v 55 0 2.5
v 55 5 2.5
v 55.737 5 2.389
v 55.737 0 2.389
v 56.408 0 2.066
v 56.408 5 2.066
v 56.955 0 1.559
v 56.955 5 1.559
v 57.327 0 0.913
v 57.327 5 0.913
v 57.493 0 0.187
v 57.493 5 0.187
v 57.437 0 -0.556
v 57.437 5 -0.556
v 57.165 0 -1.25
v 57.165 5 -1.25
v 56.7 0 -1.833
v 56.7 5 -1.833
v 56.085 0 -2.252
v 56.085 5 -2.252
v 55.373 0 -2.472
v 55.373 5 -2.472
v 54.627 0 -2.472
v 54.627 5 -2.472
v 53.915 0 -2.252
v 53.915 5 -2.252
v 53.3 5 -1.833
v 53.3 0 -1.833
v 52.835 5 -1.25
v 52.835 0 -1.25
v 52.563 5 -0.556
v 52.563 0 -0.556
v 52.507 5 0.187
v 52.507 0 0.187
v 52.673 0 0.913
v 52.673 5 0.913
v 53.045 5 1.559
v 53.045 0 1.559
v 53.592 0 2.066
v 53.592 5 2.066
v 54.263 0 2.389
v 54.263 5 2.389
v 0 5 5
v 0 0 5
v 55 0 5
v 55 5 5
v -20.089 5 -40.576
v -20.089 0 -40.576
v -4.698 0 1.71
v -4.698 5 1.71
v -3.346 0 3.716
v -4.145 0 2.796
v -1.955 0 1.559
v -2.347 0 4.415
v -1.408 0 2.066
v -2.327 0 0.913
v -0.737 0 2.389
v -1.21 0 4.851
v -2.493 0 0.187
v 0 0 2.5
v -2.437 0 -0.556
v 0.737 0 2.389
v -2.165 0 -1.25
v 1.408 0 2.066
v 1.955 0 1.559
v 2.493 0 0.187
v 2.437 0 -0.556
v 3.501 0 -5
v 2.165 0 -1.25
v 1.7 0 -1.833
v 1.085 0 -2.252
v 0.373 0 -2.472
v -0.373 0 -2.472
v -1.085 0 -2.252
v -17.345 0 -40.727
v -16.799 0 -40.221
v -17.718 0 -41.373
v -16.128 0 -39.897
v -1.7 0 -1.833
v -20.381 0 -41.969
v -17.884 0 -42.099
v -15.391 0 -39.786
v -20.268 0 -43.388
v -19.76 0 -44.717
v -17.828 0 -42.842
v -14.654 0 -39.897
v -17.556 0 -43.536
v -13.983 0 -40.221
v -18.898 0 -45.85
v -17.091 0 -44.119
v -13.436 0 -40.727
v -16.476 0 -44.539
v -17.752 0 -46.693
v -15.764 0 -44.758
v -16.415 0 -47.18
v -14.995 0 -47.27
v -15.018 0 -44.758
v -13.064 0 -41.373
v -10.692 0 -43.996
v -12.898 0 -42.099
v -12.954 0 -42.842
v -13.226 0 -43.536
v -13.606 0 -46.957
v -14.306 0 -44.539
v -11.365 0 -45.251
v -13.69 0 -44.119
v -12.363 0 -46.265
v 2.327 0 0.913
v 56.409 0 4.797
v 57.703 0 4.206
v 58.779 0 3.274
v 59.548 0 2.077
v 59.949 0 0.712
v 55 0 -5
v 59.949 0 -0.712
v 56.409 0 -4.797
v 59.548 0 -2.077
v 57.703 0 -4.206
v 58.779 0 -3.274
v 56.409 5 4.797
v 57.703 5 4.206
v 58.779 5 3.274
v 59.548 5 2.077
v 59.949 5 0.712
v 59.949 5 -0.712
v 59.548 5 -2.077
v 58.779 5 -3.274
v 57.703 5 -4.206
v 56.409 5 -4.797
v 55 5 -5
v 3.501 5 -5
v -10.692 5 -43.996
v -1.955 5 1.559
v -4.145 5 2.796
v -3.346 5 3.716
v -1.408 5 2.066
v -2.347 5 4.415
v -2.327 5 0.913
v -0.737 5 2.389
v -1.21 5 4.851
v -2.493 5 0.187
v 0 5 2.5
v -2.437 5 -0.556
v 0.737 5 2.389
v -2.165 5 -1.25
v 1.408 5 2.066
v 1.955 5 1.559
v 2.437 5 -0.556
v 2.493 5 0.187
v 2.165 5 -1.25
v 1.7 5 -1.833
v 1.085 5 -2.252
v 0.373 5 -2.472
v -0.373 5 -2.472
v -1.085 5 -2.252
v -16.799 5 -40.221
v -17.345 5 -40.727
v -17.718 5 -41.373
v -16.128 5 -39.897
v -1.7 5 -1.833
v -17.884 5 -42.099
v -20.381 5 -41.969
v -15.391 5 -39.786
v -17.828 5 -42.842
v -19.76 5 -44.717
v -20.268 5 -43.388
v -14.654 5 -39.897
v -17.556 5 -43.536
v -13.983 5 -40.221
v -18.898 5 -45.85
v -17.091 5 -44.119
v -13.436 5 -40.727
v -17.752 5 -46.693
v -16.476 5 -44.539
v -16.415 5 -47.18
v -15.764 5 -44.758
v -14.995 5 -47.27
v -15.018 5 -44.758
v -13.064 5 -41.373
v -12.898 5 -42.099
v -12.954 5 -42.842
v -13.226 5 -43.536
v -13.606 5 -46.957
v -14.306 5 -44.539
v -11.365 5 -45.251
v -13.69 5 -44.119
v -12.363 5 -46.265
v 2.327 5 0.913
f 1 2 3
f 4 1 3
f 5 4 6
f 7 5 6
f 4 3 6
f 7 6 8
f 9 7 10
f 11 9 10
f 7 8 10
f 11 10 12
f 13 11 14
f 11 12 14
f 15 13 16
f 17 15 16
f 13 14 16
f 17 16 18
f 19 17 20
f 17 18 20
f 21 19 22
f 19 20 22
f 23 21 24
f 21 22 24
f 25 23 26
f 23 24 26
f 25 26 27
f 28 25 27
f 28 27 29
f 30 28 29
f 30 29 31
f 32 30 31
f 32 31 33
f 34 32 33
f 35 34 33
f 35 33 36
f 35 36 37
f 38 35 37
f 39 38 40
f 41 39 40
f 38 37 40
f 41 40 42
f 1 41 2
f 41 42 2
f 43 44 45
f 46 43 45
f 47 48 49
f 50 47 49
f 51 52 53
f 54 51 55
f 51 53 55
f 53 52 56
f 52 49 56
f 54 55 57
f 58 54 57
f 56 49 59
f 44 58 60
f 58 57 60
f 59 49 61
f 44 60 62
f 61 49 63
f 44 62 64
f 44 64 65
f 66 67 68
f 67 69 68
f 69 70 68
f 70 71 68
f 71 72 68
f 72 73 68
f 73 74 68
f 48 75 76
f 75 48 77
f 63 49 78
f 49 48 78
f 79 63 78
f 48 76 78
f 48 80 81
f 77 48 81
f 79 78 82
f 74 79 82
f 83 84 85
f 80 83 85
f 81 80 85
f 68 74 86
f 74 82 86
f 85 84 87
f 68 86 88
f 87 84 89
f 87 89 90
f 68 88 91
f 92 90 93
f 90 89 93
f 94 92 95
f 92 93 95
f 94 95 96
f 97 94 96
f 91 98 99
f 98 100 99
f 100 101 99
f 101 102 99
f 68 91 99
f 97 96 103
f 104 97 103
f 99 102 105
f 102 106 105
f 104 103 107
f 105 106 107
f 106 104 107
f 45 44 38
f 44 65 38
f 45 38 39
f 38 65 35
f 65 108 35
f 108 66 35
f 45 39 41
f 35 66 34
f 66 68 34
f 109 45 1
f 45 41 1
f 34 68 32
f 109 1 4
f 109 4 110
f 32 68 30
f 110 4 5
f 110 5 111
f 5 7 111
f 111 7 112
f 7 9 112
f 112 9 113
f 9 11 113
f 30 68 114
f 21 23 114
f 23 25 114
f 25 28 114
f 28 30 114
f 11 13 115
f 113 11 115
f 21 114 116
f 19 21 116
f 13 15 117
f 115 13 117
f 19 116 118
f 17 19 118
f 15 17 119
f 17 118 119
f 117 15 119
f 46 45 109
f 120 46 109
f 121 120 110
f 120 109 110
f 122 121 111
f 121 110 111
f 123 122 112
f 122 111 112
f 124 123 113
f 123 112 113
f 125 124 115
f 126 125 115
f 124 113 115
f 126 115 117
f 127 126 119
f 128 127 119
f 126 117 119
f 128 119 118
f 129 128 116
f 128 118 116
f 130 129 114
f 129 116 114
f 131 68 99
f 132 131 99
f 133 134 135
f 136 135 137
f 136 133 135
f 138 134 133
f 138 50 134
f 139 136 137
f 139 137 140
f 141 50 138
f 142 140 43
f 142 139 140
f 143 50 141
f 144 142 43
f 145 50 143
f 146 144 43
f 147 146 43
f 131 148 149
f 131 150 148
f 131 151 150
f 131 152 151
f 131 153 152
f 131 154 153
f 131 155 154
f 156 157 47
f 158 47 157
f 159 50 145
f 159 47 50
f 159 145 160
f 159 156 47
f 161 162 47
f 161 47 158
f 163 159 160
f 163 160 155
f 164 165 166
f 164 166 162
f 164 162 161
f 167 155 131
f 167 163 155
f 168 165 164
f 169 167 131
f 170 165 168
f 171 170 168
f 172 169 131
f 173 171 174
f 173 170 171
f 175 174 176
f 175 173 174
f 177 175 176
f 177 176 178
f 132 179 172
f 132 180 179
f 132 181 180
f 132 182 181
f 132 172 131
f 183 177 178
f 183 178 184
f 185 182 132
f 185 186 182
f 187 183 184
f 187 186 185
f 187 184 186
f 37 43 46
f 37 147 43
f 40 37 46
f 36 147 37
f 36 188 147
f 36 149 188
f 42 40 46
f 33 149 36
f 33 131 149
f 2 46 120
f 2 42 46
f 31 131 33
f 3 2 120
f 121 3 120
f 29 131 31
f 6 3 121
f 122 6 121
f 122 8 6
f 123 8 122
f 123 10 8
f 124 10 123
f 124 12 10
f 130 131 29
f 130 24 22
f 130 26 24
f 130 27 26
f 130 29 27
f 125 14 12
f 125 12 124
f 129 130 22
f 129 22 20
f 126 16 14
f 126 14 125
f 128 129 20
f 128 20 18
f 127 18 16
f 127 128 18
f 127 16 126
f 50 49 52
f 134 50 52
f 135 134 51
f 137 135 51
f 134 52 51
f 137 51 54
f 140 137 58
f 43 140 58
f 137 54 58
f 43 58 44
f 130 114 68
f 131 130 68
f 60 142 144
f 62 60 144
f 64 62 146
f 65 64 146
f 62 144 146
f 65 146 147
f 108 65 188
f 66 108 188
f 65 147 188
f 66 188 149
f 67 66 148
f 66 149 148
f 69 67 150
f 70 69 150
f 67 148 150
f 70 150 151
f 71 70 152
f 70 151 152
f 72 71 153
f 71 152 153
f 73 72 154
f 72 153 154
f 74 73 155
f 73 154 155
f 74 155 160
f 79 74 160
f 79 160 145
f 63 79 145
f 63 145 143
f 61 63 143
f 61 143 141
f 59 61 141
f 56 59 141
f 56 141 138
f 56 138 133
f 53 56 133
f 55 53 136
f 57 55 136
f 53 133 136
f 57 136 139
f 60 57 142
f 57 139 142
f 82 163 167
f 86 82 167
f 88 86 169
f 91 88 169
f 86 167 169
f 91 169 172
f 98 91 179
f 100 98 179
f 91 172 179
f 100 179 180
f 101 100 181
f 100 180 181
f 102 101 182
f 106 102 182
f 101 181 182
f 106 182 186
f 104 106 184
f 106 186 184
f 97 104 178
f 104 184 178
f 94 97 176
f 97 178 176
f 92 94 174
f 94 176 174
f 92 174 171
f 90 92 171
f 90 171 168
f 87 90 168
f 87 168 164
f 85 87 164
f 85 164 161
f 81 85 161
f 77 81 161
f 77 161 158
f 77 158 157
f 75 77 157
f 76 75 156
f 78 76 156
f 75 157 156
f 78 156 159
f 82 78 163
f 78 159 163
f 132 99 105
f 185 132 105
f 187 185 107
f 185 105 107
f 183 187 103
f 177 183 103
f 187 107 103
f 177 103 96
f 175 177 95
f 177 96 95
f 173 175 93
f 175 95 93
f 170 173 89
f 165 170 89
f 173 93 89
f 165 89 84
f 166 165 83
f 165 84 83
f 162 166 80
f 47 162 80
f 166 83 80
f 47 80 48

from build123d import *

# Parameters (mm, degrees)
BOSS_EXTRU_1_DEPTH      = 5
ESQUISSE3_R             = 2.5
ENL_V_MAT_EXTRU_1_DEPTH = 5
ESQUISSE4_R             = 2.5
ENL_V_MAT_EXTRU_2_DEPTH = 5


with BuildPart() as part:
    # Esquisse2 → Boss.-Extru.1 (new body)
    with BuildSketch(Plane(origin=(0, 0, 0), x_dir=(1, 0, 0), z_dir=(0, 1, 0))):
        with BuildLine():
            ThreePointArc((-4.698463104, -1.710100717), (-4.095760221, 2.867882182), (0, 5))
            Line((0, 5), (3.501037691, 5))
            Line((3.501037691, 5), (-10.692443346, 43.996268652))
            ThreePointArc((-10.692443346, 43.996268652), (-17.101007166, 46.984631039), (-20.089369554, 40.576067219))
            Line((-20.089369554, 40.576067219), (-4.698463104, -1.710100717))
        make_face()
        with BuildLine():
            Line((55, 5), (3.501037691, 5))
            Line((3.501037691, 5), (4.698463104, 1.710100717))
            ThreePointArc((4.698463104, 1.710100717), (4.095760221, -2.867882182), (0, -5))
            Line((0, -5), (55, -5))
            ThreePointArc((55, -5), (60, 0), (55, 5))
        make_face()
        with BuildLine():
            Line((3.501037691, 5), (0, 5))
            ThreePointArc((0, 5), (-4.095760221, 2.867882182), (-4.698463104, -1.710100717))
            ThreePointArc((-4.698463104, -1.710100717), (-2.867882182, -4.095760221), (0, -5))
            ThreePointArc((0, -5), (4.095760221, -2.867882182), (4.698463104, 1.710100717))
            Line((4.698463104, 1.710100717), (3.501037691, 5))
        make_face()
    extrude(amount=BOSS_EXTRU_1_DEPTH)

    # Esquisse3 → Enlèv. mat.-Extru.1 (cut)
    with BuildSketch(Plane(origin=(0, 5, 0), x_dir=(1, 0, 0), z_dir=(0, 1, 0))):
        with Locations(Location((-15.39090645, 42.286167935, 0), (0, 0, 270))):
            Circle(ESQUISSE3_R)
        with Locations(Location((55, 0, 0), (0, 0, 270))):
            Circle(ESQUISSE3_R)
    extrude(amount=-ENL_V_MAT_EXTRU_1_DEPTH, mode=Mode.SUBTRACT)

    # Esquisse4 → Enlèv. mat.-Extru.2 (cut)
    with BuildSketch(Plane(origin=(0, 5, 0), x_dir=(1, 0, 0), z_dir=(0, 1, 0))):
        with Locations(Location((0, 0, 0), (0, 0, 270))):
            Circle(ESQUISSE4_R)
    extrude(amount=-ENL_V_MAT_EXTRU_2_DEPTH, mode=Mode.SUBTRACT)


solid = part.part
